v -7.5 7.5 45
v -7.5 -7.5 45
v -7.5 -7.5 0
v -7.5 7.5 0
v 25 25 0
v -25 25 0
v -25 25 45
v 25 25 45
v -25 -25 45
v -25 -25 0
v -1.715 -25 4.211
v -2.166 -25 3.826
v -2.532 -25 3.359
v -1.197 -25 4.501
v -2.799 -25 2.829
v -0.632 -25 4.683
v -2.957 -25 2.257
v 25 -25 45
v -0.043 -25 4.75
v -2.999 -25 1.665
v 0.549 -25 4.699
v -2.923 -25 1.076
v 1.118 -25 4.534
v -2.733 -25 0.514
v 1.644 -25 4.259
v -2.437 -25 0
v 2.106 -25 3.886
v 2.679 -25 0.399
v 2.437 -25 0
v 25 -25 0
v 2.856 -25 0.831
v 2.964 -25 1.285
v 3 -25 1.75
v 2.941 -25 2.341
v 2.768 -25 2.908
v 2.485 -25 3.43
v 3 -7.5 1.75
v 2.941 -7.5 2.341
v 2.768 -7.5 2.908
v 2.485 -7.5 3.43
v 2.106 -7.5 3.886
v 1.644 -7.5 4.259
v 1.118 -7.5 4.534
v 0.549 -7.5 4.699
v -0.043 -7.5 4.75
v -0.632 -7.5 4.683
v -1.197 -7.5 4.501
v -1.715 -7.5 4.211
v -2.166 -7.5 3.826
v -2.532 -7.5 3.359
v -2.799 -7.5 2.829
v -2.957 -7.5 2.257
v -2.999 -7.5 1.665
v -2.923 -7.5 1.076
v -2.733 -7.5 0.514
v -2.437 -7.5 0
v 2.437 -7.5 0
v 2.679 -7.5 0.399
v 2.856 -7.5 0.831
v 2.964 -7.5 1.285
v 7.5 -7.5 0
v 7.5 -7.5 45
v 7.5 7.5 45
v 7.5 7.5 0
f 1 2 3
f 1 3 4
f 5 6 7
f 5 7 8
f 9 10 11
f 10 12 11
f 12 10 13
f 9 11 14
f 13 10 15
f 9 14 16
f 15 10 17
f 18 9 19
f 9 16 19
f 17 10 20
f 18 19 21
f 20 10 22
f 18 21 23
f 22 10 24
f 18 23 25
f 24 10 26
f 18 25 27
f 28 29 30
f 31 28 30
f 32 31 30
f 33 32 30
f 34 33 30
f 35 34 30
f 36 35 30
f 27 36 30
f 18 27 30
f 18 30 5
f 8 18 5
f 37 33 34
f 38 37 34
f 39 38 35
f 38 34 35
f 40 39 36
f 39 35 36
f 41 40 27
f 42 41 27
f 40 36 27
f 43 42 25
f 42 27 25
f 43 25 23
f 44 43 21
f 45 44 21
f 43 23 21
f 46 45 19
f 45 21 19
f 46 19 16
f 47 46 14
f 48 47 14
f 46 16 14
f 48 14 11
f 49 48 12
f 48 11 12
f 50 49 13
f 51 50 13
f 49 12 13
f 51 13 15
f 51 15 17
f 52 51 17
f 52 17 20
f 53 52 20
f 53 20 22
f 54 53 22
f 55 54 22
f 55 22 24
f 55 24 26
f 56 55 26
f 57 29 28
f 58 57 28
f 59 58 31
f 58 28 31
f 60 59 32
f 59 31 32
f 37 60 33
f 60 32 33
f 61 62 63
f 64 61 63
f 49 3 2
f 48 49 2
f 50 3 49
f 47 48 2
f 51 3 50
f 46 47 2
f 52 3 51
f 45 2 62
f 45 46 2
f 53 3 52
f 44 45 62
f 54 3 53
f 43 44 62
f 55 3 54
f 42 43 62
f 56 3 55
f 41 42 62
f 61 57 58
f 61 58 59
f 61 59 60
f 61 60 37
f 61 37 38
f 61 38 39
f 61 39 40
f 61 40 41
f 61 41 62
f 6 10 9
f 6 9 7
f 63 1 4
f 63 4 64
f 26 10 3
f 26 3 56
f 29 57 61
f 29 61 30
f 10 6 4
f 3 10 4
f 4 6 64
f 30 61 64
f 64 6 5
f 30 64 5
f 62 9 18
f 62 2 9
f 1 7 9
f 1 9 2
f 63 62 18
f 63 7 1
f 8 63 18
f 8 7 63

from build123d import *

# Parameters (mm, degrees)
F0_W     = 50
F0_H     = 50
F0_W_2   = 15
F0_H_2   = 15
F1_DEPTH = 45
F3_DEPTH = 25


with BuildPart() as f1:
    # F0 (on Top) → F1 (new body)
    with BuildSketch(Plane.XY):
        Rectangle(F0_W, F0_H)
        Rectangle(F0_W_2, F0_H_2, mode=Mode.SUBTRACT)
    extrude(amount=F1_DEPTH)

    # F2 (on face) → F3 (cut)
    with BuildSketch(Plane.XZ.offset(25)):
        with BuildLine():
            ThreePointArc((2.4366985862, 0), (2.8557044454, 0.8307872277), (3, 1.75))
            ThreePointArc((3, 1.75), (-0.9192127723, 4.6057044454), (-2.4366985862, 0))
            Line((-2.4366985862, 0), (2.4366985862, 0))
        make_face()
    extrude(amount=-F3_DEPTH, mode=Mode.SUBTRACT)


solid = f1.part
